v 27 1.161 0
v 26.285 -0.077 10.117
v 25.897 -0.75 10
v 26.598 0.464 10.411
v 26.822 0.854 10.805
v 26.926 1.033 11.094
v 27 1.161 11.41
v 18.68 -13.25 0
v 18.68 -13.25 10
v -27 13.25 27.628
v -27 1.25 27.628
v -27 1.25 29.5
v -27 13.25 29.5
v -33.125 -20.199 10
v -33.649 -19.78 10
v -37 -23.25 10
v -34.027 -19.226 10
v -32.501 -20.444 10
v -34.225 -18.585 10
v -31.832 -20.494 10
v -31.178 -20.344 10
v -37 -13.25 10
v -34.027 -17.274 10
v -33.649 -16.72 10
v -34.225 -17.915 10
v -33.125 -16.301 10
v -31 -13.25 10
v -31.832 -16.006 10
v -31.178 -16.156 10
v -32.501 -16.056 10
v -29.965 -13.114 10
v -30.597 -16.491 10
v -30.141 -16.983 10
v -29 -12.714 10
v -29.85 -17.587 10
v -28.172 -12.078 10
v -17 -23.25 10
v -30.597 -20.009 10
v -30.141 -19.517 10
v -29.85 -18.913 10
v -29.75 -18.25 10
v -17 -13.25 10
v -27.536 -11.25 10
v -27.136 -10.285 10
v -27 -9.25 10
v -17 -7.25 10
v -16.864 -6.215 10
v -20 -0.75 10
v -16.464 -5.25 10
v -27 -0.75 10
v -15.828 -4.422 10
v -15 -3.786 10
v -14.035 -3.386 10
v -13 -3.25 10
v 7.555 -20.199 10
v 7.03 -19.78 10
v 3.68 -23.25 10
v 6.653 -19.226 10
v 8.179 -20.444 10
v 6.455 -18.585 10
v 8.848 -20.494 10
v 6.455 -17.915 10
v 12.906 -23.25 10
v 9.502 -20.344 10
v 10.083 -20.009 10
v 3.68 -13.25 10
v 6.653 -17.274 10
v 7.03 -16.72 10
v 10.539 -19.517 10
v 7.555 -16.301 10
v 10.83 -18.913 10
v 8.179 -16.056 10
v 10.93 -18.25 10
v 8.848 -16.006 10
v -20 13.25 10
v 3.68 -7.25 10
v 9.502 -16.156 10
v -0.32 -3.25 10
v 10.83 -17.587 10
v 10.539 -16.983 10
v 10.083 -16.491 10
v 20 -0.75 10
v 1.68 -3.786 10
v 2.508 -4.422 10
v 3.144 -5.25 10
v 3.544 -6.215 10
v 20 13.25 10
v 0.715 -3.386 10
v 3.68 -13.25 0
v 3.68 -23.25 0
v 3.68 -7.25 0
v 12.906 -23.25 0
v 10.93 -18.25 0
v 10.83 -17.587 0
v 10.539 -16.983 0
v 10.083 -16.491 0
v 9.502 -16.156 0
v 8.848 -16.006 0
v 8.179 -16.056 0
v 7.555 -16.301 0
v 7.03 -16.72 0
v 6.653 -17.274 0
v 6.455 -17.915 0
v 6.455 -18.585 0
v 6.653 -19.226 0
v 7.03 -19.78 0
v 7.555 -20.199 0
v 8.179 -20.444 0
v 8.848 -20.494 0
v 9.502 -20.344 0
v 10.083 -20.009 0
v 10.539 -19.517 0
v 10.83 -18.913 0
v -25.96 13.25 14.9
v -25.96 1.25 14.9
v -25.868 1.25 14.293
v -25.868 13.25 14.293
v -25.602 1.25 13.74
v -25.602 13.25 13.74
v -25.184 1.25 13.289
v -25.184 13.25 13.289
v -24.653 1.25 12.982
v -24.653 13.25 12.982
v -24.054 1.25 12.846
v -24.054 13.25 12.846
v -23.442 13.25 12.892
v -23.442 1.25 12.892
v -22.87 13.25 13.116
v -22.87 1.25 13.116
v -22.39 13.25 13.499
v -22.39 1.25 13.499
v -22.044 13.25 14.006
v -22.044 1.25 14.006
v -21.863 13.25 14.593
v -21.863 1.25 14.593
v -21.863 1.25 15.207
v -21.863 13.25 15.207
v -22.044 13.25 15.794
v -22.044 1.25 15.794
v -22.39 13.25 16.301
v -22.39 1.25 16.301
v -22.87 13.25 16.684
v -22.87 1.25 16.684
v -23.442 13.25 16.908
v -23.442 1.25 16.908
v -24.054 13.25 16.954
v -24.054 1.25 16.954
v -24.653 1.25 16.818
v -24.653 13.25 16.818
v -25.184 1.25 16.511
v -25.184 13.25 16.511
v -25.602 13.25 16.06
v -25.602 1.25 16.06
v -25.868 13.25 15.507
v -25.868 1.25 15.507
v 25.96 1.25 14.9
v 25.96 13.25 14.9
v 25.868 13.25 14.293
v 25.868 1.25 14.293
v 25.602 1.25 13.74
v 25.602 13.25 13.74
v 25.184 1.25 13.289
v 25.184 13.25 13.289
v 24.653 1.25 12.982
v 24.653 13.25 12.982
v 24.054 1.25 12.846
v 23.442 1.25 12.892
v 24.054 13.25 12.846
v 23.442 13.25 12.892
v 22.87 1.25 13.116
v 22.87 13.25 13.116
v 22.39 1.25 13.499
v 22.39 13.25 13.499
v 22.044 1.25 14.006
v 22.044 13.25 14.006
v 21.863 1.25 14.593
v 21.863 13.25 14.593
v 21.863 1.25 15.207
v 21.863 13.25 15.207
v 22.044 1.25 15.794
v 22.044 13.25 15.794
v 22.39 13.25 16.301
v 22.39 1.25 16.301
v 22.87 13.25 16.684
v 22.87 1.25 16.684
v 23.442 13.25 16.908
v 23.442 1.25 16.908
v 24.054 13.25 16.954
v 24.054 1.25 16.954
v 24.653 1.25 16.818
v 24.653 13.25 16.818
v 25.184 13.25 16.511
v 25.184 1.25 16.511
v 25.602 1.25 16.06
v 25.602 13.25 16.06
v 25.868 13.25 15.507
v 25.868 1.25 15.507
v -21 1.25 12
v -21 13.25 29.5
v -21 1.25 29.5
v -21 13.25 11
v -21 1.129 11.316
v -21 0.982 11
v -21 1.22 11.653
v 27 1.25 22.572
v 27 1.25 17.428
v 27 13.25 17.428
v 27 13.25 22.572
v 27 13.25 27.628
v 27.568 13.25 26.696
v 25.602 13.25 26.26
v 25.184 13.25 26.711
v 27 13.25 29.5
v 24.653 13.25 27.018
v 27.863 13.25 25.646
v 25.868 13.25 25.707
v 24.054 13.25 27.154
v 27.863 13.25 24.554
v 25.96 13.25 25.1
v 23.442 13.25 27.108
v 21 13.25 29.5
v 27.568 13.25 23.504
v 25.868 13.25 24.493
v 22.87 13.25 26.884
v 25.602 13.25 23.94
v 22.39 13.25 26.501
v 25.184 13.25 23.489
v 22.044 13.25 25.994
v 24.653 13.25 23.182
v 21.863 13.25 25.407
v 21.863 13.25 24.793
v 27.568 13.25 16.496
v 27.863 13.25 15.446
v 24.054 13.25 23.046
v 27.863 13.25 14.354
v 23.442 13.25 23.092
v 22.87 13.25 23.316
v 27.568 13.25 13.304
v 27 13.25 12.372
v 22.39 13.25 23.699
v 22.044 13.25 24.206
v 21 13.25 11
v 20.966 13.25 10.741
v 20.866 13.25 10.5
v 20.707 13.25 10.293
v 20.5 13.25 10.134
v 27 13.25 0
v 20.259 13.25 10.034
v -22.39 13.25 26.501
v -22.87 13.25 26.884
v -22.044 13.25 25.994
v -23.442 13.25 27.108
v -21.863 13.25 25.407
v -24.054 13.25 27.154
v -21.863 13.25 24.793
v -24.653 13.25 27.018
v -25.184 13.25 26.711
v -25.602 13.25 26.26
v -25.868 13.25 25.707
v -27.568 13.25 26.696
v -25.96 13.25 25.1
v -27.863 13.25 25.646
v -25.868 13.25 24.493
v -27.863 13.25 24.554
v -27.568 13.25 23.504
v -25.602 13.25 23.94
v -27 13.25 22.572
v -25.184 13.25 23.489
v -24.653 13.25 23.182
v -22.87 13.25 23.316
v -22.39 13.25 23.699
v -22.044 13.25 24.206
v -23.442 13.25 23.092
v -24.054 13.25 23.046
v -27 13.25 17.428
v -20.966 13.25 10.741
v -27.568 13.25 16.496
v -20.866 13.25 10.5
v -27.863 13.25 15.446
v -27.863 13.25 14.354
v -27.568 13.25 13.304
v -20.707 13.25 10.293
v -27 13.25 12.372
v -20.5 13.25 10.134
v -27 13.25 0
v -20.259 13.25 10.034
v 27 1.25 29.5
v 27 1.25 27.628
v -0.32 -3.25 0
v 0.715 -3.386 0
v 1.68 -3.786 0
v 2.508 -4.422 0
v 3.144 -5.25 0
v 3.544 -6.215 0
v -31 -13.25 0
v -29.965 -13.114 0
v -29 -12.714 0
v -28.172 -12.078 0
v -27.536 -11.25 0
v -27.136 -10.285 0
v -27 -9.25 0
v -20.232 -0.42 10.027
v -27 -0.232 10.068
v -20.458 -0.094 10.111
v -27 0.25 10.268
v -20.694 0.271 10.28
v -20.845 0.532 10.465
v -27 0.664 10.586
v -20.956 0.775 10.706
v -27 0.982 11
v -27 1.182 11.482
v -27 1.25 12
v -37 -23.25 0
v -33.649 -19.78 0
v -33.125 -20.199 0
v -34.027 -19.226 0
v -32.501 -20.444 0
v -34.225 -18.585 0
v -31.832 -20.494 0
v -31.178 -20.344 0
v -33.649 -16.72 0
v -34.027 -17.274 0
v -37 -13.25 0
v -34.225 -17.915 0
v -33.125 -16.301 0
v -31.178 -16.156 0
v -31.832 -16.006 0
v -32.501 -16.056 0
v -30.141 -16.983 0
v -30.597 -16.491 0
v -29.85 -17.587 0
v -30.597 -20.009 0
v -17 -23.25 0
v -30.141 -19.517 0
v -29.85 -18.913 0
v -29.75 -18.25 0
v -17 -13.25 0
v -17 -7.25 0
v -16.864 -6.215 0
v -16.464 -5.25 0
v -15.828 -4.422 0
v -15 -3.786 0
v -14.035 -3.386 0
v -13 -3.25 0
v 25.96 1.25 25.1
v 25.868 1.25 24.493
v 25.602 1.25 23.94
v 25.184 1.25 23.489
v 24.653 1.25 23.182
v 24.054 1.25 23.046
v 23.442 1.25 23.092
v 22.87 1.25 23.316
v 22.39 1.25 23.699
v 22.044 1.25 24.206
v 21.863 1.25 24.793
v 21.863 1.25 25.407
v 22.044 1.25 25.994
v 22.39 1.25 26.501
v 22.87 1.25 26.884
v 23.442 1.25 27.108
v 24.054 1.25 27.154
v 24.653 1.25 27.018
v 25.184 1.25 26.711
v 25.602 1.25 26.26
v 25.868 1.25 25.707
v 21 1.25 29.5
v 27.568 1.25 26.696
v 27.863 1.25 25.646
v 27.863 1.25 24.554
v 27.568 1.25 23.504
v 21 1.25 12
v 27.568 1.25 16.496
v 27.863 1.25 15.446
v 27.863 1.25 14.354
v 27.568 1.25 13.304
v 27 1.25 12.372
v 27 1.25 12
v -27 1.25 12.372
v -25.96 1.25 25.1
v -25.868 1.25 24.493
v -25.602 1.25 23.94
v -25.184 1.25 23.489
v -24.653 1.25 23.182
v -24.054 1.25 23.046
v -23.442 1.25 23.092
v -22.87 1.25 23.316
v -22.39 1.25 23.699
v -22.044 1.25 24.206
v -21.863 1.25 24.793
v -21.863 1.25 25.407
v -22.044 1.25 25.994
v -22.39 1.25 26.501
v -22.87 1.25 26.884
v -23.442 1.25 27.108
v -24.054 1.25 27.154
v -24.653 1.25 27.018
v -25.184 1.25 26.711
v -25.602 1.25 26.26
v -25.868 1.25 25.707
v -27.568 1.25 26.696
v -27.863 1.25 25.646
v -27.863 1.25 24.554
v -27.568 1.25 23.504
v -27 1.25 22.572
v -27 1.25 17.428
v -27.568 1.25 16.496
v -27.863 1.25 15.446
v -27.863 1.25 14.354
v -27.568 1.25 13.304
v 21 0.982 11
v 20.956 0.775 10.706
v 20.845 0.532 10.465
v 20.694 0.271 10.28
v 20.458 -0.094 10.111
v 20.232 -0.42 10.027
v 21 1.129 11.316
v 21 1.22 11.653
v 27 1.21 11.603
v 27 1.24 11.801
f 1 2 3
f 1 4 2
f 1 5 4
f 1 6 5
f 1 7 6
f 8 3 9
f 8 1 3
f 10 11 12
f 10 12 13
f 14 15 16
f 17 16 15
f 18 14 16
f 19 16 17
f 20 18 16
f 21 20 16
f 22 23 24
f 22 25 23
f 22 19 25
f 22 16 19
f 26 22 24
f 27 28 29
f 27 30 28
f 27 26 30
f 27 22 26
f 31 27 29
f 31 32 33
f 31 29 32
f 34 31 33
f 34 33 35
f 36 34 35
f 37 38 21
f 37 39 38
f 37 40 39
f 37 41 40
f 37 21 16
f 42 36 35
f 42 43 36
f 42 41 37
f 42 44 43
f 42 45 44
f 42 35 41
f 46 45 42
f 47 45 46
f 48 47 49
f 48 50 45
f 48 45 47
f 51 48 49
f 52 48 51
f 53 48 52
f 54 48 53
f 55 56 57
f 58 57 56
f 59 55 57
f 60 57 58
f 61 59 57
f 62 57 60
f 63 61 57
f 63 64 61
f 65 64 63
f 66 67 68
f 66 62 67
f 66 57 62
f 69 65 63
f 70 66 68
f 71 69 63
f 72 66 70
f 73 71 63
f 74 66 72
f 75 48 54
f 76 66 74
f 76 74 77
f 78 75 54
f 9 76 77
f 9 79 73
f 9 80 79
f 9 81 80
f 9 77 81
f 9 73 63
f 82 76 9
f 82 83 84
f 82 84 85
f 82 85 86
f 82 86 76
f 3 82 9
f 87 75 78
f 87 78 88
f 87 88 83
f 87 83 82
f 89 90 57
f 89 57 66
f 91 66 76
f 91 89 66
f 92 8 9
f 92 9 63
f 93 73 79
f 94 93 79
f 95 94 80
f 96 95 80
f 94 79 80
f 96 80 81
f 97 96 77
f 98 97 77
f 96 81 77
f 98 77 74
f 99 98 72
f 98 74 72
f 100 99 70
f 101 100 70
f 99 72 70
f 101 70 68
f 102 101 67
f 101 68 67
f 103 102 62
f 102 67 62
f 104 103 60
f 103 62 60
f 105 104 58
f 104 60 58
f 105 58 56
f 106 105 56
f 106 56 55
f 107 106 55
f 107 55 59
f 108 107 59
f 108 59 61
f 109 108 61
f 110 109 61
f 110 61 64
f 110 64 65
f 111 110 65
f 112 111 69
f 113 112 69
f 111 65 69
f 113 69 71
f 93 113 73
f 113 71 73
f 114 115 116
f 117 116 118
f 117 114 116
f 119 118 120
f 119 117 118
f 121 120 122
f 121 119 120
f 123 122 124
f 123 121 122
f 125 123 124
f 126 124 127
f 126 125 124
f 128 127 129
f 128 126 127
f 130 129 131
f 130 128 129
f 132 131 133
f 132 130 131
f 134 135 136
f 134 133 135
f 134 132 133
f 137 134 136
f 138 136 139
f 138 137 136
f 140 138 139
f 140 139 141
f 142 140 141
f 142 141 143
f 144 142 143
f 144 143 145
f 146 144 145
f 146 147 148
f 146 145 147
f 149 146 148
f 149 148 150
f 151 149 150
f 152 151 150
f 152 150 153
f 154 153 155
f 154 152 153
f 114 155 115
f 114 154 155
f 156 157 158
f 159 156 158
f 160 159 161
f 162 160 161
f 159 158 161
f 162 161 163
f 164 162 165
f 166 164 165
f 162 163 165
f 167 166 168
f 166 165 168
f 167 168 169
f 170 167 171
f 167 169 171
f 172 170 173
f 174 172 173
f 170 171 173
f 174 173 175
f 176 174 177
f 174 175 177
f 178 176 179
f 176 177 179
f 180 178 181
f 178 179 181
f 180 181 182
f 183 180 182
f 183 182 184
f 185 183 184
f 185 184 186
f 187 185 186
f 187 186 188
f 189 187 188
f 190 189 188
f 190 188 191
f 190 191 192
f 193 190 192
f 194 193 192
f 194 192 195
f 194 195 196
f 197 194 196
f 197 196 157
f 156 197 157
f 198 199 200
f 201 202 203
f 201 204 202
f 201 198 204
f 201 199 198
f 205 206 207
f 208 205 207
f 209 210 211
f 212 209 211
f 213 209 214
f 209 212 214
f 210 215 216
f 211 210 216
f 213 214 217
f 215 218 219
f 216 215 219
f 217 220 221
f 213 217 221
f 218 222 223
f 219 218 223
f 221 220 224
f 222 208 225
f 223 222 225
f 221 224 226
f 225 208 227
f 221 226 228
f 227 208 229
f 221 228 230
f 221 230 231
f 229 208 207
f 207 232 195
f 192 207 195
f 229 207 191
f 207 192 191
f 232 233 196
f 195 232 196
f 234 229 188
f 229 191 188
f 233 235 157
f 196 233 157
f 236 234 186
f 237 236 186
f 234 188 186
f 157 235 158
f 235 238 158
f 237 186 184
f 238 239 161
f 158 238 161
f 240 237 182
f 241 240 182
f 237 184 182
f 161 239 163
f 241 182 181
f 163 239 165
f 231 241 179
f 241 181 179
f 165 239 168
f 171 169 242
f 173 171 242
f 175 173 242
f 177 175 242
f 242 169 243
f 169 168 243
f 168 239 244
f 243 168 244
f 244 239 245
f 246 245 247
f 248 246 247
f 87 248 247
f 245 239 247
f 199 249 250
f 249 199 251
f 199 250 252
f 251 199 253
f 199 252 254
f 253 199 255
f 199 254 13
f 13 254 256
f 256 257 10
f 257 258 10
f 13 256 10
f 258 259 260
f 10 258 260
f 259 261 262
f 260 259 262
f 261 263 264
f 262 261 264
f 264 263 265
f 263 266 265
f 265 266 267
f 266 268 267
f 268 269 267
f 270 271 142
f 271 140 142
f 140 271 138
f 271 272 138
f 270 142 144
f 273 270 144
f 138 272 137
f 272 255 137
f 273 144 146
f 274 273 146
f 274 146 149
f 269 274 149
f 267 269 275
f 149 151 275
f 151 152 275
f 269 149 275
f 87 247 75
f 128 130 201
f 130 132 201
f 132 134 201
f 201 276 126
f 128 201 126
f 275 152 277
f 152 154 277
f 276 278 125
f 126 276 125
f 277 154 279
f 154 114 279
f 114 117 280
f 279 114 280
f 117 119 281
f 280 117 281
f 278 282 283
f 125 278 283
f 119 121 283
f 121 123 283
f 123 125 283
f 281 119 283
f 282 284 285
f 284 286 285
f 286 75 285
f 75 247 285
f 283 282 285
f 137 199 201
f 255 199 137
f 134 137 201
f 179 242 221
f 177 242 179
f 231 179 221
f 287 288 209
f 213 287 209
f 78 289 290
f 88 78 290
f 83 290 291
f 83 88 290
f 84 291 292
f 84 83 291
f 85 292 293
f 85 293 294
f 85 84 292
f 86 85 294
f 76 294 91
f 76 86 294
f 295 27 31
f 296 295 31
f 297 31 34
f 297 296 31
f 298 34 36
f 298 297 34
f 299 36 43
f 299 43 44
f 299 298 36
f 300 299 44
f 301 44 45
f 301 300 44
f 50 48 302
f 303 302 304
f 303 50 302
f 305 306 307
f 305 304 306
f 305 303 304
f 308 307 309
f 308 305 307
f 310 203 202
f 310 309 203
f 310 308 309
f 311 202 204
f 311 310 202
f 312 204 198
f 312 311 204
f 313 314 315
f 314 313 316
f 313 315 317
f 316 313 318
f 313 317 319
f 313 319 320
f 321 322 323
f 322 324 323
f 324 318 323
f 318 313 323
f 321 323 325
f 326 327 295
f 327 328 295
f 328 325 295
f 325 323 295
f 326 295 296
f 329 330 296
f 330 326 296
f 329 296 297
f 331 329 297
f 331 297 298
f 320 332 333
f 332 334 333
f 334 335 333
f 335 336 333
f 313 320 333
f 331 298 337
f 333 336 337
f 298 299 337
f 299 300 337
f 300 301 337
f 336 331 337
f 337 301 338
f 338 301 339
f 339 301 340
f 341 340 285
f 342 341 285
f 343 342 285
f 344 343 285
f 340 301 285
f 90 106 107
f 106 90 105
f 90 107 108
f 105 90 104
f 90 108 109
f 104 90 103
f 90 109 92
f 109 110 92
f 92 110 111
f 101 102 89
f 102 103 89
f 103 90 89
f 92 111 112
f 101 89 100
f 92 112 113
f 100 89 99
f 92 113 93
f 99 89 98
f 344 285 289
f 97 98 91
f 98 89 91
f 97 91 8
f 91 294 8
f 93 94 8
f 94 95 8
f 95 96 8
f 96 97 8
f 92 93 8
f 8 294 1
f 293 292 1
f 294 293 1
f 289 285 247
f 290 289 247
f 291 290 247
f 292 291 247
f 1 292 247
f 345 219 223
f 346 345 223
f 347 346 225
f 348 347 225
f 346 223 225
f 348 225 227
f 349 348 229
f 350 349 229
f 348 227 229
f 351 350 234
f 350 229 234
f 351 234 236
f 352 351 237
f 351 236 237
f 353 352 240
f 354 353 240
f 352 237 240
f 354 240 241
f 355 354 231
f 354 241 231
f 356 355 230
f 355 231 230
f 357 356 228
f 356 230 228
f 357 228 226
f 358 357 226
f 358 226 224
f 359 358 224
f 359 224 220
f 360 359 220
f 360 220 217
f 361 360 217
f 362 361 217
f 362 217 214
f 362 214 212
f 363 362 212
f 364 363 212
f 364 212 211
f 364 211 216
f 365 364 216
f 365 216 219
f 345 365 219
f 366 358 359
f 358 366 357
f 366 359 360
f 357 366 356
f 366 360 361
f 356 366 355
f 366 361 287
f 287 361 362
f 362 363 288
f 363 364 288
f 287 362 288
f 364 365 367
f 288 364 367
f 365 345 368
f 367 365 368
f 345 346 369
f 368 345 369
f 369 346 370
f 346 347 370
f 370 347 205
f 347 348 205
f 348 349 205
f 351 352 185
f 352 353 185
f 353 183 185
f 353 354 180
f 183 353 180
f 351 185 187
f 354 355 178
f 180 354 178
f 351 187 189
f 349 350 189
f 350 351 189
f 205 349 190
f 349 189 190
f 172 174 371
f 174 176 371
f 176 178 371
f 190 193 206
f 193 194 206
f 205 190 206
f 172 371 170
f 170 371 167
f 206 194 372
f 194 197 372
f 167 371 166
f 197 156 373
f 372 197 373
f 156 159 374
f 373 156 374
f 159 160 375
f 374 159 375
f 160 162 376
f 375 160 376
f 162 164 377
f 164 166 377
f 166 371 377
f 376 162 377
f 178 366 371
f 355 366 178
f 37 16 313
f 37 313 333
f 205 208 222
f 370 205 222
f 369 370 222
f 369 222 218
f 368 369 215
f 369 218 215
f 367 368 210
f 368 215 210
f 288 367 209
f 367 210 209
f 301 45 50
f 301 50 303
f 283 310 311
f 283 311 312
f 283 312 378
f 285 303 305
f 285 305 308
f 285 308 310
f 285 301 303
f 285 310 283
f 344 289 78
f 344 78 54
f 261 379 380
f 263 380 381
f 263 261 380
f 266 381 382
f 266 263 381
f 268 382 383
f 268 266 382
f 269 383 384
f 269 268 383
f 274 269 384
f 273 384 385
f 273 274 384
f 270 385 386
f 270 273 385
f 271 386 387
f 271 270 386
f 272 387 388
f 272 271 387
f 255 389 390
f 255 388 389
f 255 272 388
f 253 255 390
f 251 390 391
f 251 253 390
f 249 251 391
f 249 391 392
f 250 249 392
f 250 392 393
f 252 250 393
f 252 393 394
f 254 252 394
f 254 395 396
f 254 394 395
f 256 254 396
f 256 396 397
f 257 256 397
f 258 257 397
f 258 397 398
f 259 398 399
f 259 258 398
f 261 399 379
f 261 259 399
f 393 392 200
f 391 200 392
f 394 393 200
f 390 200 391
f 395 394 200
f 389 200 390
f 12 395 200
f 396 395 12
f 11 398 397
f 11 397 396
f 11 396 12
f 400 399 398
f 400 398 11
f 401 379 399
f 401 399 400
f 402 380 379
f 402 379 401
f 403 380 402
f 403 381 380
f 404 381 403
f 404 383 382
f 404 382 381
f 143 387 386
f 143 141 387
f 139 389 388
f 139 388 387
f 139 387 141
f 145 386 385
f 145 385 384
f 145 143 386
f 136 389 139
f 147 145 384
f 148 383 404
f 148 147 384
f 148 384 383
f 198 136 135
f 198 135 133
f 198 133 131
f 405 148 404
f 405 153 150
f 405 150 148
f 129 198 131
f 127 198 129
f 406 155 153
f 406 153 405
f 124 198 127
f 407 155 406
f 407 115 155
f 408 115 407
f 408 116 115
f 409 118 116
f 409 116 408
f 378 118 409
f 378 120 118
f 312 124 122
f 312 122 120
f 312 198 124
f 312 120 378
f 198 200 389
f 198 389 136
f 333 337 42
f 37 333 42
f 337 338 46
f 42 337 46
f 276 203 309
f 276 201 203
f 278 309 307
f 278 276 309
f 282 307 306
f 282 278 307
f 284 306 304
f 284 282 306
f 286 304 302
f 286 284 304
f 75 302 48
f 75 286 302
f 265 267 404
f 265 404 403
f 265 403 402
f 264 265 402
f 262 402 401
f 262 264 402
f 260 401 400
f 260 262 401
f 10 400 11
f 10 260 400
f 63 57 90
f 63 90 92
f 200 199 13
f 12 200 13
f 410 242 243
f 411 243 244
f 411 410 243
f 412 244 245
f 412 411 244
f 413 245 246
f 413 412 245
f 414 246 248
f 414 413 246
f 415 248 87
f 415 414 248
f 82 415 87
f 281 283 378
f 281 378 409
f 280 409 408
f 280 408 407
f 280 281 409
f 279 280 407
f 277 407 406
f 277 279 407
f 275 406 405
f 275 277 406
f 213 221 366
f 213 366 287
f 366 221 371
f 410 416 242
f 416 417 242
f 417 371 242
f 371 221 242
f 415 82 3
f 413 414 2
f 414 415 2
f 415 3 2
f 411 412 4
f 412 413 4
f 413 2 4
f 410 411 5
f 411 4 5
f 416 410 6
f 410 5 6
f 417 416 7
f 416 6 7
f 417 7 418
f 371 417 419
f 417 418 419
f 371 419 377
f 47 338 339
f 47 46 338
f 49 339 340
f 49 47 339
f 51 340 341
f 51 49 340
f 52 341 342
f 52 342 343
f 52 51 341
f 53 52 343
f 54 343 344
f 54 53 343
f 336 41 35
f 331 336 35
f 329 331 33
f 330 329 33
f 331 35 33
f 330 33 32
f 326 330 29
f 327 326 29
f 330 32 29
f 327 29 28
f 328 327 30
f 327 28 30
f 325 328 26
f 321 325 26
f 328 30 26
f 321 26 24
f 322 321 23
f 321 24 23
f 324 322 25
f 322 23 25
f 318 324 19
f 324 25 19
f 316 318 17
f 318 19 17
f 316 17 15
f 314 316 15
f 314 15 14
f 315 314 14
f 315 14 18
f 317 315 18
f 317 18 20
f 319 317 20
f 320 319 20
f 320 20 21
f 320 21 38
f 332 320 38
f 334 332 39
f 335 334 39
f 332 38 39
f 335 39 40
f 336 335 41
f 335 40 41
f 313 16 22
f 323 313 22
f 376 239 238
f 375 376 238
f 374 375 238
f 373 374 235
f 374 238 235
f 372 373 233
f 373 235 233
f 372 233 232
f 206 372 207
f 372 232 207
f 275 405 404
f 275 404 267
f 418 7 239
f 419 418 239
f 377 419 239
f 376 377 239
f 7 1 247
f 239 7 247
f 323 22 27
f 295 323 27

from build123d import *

# Parameters (mm, degrees)
SKETCH1_W            = 54
SKETCH1_H            = 26.5
BOSS_EXTRUDE1_DEPTH  = 10
CUT_EXTRUDE1_DEPTH   = 10
SKETCH3_W            = 15
SKETCH3_H            = 10
SKETCH3_W_2          = 10
BOSS_EXTRUDE2_DEPTH  = 10
CUT_EXTRUDE2_DEPTH   = 10
SKETCH5_W            = 20.679801083
SKETCH5_H            = 5
CUT_EXTRUDE3_DEPTH   = 10
SKETCH6_W            = 6
SKETCH6_H            = 12
BOSS_EXTRUDE3_DEPTH  = 19.5
SKETCH7_R            = 2.06
CUT_EXTRUDE4_DEPTH   = 37.5
SKETCH8_R            = 2.06
BOSS_EXTRUDE4_DEPTH  = 12
FILLET1_R            = 2
FILLET2_R            = 1
FILLET1_OF_MIRROR1_R = 2
FILLET2_OF_MIRROR1_R = 1
SKETCH9_R            = 2.25
CUT_EXTRUDE5_DEPTH   = 10
CUT_EXTRUDE6_DEPTH   = 10
SKETCH11_W           = 20.679801083
SKETCH11_H           = 10
CUT_EXTRUDE7_DEPTH   = 10
FILLET3_R            = 4
SKETCH12_W           = 10
SKETCH12_H           = 10
BOSS_EXTRUDE5_DEPTH  = 10
SKETCH13_R           = 2.25
CUT_EXTRUDE8_DEPTH   = 10
FILLET4_R            = 4


with BuildPart() as part:
    # Sketch1 → Boss-Extrude1 (new body)
    with BuildSketch(Plane.XY):
        Rectangle(SKETCH1_W, SKETCH1_H)
    boss_extrude1 = extrude(amount=BOSS_EXTRUDE1_DEPTH)

    # Sketch2 → Cut-Extrude1 (cut)
    with BuildSketch(Plane(origin=(0, 0, 0), x_dir=(-1, 0, 0), z_dir=(0, 0, -1))):
        Polygon((-27, 1.161007253), (-18.679801083, -13.25), (-27, -13.25), align=None)
    extrude(amount=-CUT_EXTRUDE1_DEPTH, mode=Mode.SUBTRACT)

    # Sketch3 → Boss-Extrude2 (add)
    with BuildSketch(Plane.XZ.offset(13.25)):
        with Locations((11.179801083, 5)):
            Rectangle(SKETCH3_W, SKETCH3_H)
        with Locations((-22, 5)):
            Rectangle(SKETCH3_W_2, SKETCH3_H)
    extrude(amount=BOSS_EXTRUDE2_DEPTH)

    # Sketch4 → Cut-Extrude2 (cut)
    with BuildSketch(Plane(origin=(0, 0, 0), x_dir=(-1, 0, 0), z_dir=(0, 0, -1))):
        Polygon((-18.679801083, -13.25), (-12.906298391, -23.25), (-18.679801083, -23.25), align=None)
    extrude(amount=-CUT_EXTRUDE2_DEPTH, mode=Mode.SUBTRACT)

    # Sketch5 → Cut-Extrude3 (cut)
    with BuildSketch(Plane(origin=(0, 0, 0), x_dir=(-1, 0, 0), z_dir=(0, 0, -1))):
        with Locations((6.660099458, -10.75)):
            Rectangle(SKETCH5_W, SKETCH5_H)
    extrude(amount=-CUT_EXTRUDE3_DEPTH, mode=Mode.SUBTRACT)

    # Sketch6 → Boss-Extrude3 (add)
    with BuildSketch(Plane.XY.offset(10)):
        with Locations((24, 7.25)):
            Rectangle(SKETCH6_W, SKETCH6_H)
    boss_extrude3 = extrude(amount=BOSS_EXTRUDE3_DEPTH)

    # Sketch7 → Cut-Extrude4 (cut, through all)
    with BuildSketch(Plane(origin=(0, 13.25, 0), x_dir=(1, 0, 0), z_dir=(0, 1, 0))):
        with Locations((23.9, -25.1)):
            Circle(SKETCH7_R)
        with Locations((23.9, -14.9)):
            Circle(SKETCH7_R)
    cut_extrude4 = extrude(amount=-CUT_EXTRUDE4_DEPTH, mode=Mode.SUBTRACT)

    # Sketch8 → Boss-Extrude4 (add)
    with BuildSketch(Plane(origin=(0, 13.25, 0), x_dir=(1, 0, 0), z_dir=(0, 1, 0))):
        with BuildLine():
            Line((21, -27.854995463), (21, -22.345004537))
            ThreePointArc((21, -22.345004537), (27.9, -25.1), (21, -27.854995463))
        make_face()
        with Locations((23.9, -25.1)):
            Circle(SKETCH8_R, mode=Mode.SUBTRACT)
        with BuildLine():
            Line((21, -17.654995463), (21, -12.145004537))
            ThreePointArc((21, -12.145004537), (27.9, -14.9), (21, -17.654995463))
        make_face()
        with Locations((23.9, -14.9)):
            Circle(SKETCH8_R, mode=Mode.SUBTRACT)
    boss_extrude4 = extrude(amount=-BOSS_EXTRUDE4_DEPTH)

    # Fillet1
    fillet1_edges = [part.edges().sort_by_distance(p)[0] for p in [
        (24, 1.25, 10),
    ]]
    fillet(fillet1_edges, radius=FILLET1_R)

    # Fillet2
    fillet2_edges = [part.edges().sort_by_distance(p)[0] for p in [
        (21, 7.25, 10),
    ]]
    fillet(fillet2_edges, radius=FILLET2_R)

    # Mirror1: Boss-Extrude1, Boss-Extrude3, Cut-Extrude4, Boss-Extrude4 across plane
    add(boss_extrude1.mirror(Plane(origin=(0, 0, 0), x_dir=(0, 0, 1), z_dir=(1, 0, 0))))
    add(boss_extrude3.mirror(Plane(origin=(0, 0, 0), x_dir=(0, 0, 1), z_dir=(1, 0, 0))))
    add(cut_extrude4.mirror(Plane(origin=(0, 0, 0), x_dir=(0, 0, 1), z_dir=(1, 0, 0))), mode=Mode.SUBTRACT)
    add(boss_extrude4.mirror(Plane(origin=(0, 0, 0), x_dir=(0, 0, 1), z_dir=(1, 0, 0))))

    # Fillet1 of Mirror1
    fillet1_of_mirror1_edges = [part.edges().sort_by_distance(p)[0] for p in [
        (-24, 1.25, 10),
    ]]
    fillet(fillet1_of_mirror1_edges, radius=FILLET1_OF_MIRROR1_R)

    # Fillet2 of Mirror1
    fillet2_of_mirror1_edges = [part.edges().sort_by_distance(p)[0] for p in [
        (-21, 7.25, 10),
    ]]
    fillet(fillet2_of_mirror1_edges, radius=FILLET2_OF_MIRROR1_R)

    # Sketch9 → Cut-Extrude5 (cut)
    with BuildSketch(Plane.XY.offset(10)):
        with Locations((8.679801083, -18.25)):
            Circle(SKETCH9_R)
    extrude(amount=-CUT_EXTRUDE5_DEPTH, mode=Mode.SUBTRACT)

    # Sketch10 → Cut-Extrude6 (cut)
    with BuildSketch(Plane(origin=(0, 0, 0), x_dir=(-1, 0, 0), z_dir=(0, 0, -1))):
        Polygon((-27, 1.161007253), (-18.679801083, -13.25), (-27, -13.25), align=None)
    extrude(amount=-CUT_EXTRUDE6_DEPTH, mode=Mode.SUBTRACT)

    # Sketch11 → Cut-Extrude7 (cut)
    with BuildSketch(Plane(origin=(0, 0, 0), x_dir=(-1, 0, 0), z_dir=(0, 0, -1))):
        with Locations((6.660099458, -8.25)):
            Rectangle(SKETCH11_W, SKETCH11_H)
    extrude(amount=-CUT_EXTRUDE7_DEPTH, mode=Mode.SUBTRACT)

    # Fillet3
    fillet3_edges = [part.edges().sort_by_distance(p)[0] for p in [
        (-17, -3.25, 5),
        (3.679801083, -3.25, 5),
    ]]
    fillet(fillet3_edges, radius=FILLET3_R)

    # Sketch12 → Boss-Extrude5 (add)
    with BuildSketch(Plane.XY.offset(10)):
        with Locations((-32, -18.25)):
            Rectangle(SKETCH12_W, SKETCH12_H)
    extrude(amount=-BOSS_EXTRUDE5_DEPTH)

    # Sketch13 → Cut-Extrude8 (cut)
    with BuildSketch(Plane.XY.offset(10)):
        with Locations((-32, -18.25)):
            Circle(SKETCH13_R)
    extrude(amount=-CUT_EXTRUDE8_DEPTH, mode=Mode.SUBTRACT)

    # Fillet4
    fillet4_edges = [part.edges().sort_by_distance(p)[0] for p in [
        (-27, -13.25, 5),
    ]]
    fillet(fillet4_edges, radius=FILLET4_R)


solid = part.part
